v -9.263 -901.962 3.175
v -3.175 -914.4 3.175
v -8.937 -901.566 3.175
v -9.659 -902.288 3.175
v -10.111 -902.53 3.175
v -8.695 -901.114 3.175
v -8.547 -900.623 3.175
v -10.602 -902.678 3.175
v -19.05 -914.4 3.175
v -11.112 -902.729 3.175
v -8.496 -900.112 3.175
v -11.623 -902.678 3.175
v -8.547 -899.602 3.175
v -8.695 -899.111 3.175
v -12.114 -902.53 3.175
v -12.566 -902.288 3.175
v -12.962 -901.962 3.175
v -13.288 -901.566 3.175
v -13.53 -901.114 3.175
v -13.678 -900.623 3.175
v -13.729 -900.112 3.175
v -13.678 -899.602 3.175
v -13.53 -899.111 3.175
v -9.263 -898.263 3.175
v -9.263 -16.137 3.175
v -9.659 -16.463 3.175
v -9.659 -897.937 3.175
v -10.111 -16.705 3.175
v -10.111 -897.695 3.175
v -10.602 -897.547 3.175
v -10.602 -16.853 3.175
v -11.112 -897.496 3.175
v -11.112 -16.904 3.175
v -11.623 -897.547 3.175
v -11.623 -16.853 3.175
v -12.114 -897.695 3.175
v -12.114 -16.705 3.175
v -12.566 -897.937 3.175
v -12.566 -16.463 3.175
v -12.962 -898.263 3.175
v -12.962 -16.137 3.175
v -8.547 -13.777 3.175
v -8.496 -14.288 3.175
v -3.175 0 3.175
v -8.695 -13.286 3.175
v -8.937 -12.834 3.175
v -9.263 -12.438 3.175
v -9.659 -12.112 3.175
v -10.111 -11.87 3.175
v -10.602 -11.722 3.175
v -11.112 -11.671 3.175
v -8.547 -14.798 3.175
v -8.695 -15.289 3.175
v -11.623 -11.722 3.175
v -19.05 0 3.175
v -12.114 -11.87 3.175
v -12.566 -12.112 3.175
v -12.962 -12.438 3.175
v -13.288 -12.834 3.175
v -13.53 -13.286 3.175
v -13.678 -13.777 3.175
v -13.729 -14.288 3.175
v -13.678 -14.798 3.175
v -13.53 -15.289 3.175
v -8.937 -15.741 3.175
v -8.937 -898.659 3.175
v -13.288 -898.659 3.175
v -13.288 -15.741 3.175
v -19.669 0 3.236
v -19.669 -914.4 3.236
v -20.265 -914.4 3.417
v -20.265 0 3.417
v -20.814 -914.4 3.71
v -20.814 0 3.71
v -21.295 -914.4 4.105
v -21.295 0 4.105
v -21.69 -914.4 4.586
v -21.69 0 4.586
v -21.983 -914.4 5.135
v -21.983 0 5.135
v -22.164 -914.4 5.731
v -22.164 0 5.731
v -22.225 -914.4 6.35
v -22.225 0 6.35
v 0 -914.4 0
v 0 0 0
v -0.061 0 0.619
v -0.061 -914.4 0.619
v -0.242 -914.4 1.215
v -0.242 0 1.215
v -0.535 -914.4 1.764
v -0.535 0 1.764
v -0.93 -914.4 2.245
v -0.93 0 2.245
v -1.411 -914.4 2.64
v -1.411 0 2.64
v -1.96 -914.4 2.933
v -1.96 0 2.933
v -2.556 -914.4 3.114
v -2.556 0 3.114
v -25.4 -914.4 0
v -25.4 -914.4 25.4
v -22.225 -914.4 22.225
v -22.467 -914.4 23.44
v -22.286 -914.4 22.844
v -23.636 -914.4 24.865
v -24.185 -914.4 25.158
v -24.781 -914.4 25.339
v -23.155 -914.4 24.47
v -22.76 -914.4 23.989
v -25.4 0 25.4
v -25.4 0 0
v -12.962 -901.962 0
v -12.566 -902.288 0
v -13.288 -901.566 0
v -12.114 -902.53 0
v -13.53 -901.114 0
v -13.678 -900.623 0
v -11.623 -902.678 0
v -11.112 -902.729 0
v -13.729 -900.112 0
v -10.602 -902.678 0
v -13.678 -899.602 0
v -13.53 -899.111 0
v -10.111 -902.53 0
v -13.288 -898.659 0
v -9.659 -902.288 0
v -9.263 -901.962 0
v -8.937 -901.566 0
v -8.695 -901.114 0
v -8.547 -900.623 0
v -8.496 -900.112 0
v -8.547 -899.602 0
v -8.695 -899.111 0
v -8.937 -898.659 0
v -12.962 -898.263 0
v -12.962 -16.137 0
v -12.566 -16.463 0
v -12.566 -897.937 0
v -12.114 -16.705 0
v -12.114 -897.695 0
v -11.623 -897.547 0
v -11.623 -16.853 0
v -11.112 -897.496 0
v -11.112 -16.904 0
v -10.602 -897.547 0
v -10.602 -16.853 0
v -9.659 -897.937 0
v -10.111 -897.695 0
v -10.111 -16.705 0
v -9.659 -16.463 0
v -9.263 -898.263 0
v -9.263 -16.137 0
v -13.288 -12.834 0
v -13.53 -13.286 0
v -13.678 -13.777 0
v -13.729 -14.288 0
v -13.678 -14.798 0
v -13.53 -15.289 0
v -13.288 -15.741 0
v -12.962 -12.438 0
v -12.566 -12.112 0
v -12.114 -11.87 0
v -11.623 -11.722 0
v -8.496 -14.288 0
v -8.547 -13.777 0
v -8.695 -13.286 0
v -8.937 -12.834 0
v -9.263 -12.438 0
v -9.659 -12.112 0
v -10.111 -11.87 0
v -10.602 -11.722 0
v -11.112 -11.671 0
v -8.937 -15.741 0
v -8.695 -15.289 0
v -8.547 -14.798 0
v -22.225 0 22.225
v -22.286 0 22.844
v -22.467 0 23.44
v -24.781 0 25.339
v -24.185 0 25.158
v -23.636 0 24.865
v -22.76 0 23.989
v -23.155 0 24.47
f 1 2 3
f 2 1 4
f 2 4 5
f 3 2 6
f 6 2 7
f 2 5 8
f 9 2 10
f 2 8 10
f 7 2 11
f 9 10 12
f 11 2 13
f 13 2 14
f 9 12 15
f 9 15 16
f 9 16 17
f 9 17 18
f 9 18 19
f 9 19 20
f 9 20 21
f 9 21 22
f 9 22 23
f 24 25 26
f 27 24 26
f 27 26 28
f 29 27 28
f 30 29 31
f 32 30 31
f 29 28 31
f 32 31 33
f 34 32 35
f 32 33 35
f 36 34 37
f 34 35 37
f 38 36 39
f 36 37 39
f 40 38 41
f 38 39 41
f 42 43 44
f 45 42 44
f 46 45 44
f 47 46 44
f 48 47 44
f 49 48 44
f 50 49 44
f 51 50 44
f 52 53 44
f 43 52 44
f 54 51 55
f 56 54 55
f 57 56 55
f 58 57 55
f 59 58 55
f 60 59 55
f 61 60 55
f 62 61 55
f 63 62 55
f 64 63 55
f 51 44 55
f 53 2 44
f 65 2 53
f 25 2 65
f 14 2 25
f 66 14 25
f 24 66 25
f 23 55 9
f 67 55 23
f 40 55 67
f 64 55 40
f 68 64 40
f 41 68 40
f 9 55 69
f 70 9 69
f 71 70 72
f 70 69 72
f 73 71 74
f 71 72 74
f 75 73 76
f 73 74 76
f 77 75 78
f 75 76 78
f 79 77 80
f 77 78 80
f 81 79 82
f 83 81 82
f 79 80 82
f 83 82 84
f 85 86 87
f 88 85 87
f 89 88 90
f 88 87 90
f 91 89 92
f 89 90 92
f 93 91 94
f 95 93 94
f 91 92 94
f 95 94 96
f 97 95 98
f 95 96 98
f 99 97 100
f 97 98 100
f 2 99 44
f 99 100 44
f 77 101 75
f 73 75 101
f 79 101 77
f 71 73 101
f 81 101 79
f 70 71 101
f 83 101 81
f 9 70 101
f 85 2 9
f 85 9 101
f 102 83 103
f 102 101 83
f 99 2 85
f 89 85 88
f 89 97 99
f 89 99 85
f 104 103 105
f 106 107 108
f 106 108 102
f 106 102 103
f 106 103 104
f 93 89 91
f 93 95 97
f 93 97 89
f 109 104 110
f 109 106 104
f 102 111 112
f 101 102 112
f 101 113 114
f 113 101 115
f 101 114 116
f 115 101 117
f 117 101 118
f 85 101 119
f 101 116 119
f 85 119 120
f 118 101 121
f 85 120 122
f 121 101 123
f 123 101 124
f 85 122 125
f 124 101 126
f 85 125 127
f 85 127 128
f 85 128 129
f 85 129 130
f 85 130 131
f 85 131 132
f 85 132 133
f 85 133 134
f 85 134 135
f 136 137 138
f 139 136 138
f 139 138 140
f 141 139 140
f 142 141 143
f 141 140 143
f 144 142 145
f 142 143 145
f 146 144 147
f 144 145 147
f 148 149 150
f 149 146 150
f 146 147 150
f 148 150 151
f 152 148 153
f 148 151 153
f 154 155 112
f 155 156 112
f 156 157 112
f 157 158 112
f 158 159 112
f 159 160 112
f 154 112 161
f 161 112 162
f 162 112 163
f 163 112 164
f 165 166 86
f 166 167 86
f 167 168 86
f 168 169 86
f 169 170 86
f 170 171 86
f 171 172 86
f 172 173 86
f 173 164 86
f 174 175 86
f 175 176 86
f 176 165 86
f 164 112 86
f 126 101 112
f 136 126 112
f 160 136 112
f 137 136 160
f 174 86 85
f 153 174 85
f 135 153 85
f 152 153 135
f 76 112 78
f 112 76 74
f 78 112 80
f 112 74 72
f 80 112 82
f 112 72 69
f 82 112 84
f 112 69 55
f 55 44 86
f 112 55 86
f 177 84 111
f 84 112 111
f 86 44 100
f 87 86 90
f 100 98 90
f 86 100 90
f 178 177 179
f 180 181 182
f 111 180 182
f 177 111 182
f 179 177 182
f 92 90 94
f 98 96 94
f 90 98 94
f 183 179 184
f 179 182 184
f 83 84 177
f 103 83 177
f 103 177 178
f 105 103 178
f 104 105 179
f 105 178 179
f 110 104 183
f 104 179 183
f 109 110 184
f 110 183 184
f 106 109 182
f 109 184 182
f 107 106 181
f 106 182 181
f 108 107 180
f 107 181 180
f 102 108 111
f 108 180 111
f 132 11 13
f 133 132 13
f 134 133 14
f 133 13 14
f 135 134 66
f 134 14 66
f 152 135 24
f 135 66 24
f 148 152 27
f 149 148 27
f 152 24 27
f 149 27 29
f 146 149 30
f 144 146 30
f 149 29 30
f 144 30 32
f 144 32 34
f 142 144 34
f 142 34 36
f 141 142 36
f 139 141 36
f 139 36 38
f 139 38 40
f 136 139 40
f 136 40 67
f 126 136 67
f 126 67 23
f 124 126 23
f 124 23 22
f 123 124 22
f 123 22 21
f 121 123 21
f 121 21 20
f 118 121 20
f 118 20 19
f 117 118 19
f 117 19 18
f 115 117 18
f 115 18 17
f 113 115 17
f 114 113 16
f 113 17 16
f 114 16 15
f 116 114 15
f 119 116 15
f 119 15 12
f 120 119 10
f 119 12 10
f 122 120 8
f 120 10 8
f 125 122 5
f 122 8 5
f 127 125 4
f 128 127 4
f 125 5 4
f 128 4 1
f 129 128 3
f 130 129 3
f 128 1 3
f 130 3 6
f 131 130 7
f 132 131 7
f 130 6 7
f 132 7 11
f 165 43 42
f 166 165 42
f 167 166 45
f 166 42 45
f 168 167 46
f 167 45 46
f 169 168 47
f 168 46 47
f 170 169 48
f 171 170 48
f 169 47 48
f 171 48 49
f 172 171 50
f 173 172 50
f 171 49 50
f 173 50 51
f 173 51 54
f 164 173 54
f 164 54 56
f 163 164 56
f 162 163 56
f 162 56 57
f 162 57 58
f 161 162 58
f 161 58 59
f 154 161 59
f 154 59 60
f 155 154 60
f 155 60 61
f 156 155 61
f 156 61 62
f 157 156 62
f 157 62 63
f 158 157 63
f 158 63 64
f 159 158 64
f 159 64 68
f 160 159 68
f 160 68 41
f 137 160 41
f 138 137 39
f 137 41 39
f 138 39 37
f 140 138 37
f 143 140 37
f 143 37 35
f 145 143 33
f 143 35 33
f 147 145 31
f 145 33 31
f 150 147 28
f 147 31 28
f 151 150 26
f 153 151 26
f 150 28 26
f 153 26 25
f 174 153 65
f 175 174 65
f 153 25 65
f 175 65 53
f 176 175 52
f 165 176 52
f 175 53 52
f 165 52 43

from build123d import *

# Parameters (mm, degrees)
F1_DEPTH = 914.4
F2_R     = 2.6162
F3_DEPTH = 3.176


with BuildPart() as f1:
    # F0 (on Front) → F1 (new body)
    with BuildSketch(Plane.XZ):
        with BuildLine():
            Line((-25.4, 0), (0, 0))
            ThreePointArc((0, 0), (-0.929936, 2.245064), (-3.175, 3.175))
            Line((-3.175, 3.175), (-19.05, 3.175))
            ThreePointArc((-19.05, 3.175), (-21.295064, 4.104936), (-22.225, 6.35))
            Line((-22.225, 6.35), (-22.225, 22.225))
            ThreePointArc((-22.225, 22.225), (-23.154936, 24.470064), (-25.4, 25.4))
            Line((-25.4, 25.4), (-25.4, 0))
        make_face()
    extrude(amount=F1_DEPTH)

    # F2 (on face) → F3 (cut, through all)
    with BuildSketch(Plane.XY.offset(3.175)):
        with Locations((-11.1125, -900.1125)):
            Circle(F2_R)
        with Locations((-11.1125, -14.2875)):
            Circle(F2_R)
    extrude(amount=-F3_DEPTH, mode=Mode.SUBTRACT)


solid = f1.part
